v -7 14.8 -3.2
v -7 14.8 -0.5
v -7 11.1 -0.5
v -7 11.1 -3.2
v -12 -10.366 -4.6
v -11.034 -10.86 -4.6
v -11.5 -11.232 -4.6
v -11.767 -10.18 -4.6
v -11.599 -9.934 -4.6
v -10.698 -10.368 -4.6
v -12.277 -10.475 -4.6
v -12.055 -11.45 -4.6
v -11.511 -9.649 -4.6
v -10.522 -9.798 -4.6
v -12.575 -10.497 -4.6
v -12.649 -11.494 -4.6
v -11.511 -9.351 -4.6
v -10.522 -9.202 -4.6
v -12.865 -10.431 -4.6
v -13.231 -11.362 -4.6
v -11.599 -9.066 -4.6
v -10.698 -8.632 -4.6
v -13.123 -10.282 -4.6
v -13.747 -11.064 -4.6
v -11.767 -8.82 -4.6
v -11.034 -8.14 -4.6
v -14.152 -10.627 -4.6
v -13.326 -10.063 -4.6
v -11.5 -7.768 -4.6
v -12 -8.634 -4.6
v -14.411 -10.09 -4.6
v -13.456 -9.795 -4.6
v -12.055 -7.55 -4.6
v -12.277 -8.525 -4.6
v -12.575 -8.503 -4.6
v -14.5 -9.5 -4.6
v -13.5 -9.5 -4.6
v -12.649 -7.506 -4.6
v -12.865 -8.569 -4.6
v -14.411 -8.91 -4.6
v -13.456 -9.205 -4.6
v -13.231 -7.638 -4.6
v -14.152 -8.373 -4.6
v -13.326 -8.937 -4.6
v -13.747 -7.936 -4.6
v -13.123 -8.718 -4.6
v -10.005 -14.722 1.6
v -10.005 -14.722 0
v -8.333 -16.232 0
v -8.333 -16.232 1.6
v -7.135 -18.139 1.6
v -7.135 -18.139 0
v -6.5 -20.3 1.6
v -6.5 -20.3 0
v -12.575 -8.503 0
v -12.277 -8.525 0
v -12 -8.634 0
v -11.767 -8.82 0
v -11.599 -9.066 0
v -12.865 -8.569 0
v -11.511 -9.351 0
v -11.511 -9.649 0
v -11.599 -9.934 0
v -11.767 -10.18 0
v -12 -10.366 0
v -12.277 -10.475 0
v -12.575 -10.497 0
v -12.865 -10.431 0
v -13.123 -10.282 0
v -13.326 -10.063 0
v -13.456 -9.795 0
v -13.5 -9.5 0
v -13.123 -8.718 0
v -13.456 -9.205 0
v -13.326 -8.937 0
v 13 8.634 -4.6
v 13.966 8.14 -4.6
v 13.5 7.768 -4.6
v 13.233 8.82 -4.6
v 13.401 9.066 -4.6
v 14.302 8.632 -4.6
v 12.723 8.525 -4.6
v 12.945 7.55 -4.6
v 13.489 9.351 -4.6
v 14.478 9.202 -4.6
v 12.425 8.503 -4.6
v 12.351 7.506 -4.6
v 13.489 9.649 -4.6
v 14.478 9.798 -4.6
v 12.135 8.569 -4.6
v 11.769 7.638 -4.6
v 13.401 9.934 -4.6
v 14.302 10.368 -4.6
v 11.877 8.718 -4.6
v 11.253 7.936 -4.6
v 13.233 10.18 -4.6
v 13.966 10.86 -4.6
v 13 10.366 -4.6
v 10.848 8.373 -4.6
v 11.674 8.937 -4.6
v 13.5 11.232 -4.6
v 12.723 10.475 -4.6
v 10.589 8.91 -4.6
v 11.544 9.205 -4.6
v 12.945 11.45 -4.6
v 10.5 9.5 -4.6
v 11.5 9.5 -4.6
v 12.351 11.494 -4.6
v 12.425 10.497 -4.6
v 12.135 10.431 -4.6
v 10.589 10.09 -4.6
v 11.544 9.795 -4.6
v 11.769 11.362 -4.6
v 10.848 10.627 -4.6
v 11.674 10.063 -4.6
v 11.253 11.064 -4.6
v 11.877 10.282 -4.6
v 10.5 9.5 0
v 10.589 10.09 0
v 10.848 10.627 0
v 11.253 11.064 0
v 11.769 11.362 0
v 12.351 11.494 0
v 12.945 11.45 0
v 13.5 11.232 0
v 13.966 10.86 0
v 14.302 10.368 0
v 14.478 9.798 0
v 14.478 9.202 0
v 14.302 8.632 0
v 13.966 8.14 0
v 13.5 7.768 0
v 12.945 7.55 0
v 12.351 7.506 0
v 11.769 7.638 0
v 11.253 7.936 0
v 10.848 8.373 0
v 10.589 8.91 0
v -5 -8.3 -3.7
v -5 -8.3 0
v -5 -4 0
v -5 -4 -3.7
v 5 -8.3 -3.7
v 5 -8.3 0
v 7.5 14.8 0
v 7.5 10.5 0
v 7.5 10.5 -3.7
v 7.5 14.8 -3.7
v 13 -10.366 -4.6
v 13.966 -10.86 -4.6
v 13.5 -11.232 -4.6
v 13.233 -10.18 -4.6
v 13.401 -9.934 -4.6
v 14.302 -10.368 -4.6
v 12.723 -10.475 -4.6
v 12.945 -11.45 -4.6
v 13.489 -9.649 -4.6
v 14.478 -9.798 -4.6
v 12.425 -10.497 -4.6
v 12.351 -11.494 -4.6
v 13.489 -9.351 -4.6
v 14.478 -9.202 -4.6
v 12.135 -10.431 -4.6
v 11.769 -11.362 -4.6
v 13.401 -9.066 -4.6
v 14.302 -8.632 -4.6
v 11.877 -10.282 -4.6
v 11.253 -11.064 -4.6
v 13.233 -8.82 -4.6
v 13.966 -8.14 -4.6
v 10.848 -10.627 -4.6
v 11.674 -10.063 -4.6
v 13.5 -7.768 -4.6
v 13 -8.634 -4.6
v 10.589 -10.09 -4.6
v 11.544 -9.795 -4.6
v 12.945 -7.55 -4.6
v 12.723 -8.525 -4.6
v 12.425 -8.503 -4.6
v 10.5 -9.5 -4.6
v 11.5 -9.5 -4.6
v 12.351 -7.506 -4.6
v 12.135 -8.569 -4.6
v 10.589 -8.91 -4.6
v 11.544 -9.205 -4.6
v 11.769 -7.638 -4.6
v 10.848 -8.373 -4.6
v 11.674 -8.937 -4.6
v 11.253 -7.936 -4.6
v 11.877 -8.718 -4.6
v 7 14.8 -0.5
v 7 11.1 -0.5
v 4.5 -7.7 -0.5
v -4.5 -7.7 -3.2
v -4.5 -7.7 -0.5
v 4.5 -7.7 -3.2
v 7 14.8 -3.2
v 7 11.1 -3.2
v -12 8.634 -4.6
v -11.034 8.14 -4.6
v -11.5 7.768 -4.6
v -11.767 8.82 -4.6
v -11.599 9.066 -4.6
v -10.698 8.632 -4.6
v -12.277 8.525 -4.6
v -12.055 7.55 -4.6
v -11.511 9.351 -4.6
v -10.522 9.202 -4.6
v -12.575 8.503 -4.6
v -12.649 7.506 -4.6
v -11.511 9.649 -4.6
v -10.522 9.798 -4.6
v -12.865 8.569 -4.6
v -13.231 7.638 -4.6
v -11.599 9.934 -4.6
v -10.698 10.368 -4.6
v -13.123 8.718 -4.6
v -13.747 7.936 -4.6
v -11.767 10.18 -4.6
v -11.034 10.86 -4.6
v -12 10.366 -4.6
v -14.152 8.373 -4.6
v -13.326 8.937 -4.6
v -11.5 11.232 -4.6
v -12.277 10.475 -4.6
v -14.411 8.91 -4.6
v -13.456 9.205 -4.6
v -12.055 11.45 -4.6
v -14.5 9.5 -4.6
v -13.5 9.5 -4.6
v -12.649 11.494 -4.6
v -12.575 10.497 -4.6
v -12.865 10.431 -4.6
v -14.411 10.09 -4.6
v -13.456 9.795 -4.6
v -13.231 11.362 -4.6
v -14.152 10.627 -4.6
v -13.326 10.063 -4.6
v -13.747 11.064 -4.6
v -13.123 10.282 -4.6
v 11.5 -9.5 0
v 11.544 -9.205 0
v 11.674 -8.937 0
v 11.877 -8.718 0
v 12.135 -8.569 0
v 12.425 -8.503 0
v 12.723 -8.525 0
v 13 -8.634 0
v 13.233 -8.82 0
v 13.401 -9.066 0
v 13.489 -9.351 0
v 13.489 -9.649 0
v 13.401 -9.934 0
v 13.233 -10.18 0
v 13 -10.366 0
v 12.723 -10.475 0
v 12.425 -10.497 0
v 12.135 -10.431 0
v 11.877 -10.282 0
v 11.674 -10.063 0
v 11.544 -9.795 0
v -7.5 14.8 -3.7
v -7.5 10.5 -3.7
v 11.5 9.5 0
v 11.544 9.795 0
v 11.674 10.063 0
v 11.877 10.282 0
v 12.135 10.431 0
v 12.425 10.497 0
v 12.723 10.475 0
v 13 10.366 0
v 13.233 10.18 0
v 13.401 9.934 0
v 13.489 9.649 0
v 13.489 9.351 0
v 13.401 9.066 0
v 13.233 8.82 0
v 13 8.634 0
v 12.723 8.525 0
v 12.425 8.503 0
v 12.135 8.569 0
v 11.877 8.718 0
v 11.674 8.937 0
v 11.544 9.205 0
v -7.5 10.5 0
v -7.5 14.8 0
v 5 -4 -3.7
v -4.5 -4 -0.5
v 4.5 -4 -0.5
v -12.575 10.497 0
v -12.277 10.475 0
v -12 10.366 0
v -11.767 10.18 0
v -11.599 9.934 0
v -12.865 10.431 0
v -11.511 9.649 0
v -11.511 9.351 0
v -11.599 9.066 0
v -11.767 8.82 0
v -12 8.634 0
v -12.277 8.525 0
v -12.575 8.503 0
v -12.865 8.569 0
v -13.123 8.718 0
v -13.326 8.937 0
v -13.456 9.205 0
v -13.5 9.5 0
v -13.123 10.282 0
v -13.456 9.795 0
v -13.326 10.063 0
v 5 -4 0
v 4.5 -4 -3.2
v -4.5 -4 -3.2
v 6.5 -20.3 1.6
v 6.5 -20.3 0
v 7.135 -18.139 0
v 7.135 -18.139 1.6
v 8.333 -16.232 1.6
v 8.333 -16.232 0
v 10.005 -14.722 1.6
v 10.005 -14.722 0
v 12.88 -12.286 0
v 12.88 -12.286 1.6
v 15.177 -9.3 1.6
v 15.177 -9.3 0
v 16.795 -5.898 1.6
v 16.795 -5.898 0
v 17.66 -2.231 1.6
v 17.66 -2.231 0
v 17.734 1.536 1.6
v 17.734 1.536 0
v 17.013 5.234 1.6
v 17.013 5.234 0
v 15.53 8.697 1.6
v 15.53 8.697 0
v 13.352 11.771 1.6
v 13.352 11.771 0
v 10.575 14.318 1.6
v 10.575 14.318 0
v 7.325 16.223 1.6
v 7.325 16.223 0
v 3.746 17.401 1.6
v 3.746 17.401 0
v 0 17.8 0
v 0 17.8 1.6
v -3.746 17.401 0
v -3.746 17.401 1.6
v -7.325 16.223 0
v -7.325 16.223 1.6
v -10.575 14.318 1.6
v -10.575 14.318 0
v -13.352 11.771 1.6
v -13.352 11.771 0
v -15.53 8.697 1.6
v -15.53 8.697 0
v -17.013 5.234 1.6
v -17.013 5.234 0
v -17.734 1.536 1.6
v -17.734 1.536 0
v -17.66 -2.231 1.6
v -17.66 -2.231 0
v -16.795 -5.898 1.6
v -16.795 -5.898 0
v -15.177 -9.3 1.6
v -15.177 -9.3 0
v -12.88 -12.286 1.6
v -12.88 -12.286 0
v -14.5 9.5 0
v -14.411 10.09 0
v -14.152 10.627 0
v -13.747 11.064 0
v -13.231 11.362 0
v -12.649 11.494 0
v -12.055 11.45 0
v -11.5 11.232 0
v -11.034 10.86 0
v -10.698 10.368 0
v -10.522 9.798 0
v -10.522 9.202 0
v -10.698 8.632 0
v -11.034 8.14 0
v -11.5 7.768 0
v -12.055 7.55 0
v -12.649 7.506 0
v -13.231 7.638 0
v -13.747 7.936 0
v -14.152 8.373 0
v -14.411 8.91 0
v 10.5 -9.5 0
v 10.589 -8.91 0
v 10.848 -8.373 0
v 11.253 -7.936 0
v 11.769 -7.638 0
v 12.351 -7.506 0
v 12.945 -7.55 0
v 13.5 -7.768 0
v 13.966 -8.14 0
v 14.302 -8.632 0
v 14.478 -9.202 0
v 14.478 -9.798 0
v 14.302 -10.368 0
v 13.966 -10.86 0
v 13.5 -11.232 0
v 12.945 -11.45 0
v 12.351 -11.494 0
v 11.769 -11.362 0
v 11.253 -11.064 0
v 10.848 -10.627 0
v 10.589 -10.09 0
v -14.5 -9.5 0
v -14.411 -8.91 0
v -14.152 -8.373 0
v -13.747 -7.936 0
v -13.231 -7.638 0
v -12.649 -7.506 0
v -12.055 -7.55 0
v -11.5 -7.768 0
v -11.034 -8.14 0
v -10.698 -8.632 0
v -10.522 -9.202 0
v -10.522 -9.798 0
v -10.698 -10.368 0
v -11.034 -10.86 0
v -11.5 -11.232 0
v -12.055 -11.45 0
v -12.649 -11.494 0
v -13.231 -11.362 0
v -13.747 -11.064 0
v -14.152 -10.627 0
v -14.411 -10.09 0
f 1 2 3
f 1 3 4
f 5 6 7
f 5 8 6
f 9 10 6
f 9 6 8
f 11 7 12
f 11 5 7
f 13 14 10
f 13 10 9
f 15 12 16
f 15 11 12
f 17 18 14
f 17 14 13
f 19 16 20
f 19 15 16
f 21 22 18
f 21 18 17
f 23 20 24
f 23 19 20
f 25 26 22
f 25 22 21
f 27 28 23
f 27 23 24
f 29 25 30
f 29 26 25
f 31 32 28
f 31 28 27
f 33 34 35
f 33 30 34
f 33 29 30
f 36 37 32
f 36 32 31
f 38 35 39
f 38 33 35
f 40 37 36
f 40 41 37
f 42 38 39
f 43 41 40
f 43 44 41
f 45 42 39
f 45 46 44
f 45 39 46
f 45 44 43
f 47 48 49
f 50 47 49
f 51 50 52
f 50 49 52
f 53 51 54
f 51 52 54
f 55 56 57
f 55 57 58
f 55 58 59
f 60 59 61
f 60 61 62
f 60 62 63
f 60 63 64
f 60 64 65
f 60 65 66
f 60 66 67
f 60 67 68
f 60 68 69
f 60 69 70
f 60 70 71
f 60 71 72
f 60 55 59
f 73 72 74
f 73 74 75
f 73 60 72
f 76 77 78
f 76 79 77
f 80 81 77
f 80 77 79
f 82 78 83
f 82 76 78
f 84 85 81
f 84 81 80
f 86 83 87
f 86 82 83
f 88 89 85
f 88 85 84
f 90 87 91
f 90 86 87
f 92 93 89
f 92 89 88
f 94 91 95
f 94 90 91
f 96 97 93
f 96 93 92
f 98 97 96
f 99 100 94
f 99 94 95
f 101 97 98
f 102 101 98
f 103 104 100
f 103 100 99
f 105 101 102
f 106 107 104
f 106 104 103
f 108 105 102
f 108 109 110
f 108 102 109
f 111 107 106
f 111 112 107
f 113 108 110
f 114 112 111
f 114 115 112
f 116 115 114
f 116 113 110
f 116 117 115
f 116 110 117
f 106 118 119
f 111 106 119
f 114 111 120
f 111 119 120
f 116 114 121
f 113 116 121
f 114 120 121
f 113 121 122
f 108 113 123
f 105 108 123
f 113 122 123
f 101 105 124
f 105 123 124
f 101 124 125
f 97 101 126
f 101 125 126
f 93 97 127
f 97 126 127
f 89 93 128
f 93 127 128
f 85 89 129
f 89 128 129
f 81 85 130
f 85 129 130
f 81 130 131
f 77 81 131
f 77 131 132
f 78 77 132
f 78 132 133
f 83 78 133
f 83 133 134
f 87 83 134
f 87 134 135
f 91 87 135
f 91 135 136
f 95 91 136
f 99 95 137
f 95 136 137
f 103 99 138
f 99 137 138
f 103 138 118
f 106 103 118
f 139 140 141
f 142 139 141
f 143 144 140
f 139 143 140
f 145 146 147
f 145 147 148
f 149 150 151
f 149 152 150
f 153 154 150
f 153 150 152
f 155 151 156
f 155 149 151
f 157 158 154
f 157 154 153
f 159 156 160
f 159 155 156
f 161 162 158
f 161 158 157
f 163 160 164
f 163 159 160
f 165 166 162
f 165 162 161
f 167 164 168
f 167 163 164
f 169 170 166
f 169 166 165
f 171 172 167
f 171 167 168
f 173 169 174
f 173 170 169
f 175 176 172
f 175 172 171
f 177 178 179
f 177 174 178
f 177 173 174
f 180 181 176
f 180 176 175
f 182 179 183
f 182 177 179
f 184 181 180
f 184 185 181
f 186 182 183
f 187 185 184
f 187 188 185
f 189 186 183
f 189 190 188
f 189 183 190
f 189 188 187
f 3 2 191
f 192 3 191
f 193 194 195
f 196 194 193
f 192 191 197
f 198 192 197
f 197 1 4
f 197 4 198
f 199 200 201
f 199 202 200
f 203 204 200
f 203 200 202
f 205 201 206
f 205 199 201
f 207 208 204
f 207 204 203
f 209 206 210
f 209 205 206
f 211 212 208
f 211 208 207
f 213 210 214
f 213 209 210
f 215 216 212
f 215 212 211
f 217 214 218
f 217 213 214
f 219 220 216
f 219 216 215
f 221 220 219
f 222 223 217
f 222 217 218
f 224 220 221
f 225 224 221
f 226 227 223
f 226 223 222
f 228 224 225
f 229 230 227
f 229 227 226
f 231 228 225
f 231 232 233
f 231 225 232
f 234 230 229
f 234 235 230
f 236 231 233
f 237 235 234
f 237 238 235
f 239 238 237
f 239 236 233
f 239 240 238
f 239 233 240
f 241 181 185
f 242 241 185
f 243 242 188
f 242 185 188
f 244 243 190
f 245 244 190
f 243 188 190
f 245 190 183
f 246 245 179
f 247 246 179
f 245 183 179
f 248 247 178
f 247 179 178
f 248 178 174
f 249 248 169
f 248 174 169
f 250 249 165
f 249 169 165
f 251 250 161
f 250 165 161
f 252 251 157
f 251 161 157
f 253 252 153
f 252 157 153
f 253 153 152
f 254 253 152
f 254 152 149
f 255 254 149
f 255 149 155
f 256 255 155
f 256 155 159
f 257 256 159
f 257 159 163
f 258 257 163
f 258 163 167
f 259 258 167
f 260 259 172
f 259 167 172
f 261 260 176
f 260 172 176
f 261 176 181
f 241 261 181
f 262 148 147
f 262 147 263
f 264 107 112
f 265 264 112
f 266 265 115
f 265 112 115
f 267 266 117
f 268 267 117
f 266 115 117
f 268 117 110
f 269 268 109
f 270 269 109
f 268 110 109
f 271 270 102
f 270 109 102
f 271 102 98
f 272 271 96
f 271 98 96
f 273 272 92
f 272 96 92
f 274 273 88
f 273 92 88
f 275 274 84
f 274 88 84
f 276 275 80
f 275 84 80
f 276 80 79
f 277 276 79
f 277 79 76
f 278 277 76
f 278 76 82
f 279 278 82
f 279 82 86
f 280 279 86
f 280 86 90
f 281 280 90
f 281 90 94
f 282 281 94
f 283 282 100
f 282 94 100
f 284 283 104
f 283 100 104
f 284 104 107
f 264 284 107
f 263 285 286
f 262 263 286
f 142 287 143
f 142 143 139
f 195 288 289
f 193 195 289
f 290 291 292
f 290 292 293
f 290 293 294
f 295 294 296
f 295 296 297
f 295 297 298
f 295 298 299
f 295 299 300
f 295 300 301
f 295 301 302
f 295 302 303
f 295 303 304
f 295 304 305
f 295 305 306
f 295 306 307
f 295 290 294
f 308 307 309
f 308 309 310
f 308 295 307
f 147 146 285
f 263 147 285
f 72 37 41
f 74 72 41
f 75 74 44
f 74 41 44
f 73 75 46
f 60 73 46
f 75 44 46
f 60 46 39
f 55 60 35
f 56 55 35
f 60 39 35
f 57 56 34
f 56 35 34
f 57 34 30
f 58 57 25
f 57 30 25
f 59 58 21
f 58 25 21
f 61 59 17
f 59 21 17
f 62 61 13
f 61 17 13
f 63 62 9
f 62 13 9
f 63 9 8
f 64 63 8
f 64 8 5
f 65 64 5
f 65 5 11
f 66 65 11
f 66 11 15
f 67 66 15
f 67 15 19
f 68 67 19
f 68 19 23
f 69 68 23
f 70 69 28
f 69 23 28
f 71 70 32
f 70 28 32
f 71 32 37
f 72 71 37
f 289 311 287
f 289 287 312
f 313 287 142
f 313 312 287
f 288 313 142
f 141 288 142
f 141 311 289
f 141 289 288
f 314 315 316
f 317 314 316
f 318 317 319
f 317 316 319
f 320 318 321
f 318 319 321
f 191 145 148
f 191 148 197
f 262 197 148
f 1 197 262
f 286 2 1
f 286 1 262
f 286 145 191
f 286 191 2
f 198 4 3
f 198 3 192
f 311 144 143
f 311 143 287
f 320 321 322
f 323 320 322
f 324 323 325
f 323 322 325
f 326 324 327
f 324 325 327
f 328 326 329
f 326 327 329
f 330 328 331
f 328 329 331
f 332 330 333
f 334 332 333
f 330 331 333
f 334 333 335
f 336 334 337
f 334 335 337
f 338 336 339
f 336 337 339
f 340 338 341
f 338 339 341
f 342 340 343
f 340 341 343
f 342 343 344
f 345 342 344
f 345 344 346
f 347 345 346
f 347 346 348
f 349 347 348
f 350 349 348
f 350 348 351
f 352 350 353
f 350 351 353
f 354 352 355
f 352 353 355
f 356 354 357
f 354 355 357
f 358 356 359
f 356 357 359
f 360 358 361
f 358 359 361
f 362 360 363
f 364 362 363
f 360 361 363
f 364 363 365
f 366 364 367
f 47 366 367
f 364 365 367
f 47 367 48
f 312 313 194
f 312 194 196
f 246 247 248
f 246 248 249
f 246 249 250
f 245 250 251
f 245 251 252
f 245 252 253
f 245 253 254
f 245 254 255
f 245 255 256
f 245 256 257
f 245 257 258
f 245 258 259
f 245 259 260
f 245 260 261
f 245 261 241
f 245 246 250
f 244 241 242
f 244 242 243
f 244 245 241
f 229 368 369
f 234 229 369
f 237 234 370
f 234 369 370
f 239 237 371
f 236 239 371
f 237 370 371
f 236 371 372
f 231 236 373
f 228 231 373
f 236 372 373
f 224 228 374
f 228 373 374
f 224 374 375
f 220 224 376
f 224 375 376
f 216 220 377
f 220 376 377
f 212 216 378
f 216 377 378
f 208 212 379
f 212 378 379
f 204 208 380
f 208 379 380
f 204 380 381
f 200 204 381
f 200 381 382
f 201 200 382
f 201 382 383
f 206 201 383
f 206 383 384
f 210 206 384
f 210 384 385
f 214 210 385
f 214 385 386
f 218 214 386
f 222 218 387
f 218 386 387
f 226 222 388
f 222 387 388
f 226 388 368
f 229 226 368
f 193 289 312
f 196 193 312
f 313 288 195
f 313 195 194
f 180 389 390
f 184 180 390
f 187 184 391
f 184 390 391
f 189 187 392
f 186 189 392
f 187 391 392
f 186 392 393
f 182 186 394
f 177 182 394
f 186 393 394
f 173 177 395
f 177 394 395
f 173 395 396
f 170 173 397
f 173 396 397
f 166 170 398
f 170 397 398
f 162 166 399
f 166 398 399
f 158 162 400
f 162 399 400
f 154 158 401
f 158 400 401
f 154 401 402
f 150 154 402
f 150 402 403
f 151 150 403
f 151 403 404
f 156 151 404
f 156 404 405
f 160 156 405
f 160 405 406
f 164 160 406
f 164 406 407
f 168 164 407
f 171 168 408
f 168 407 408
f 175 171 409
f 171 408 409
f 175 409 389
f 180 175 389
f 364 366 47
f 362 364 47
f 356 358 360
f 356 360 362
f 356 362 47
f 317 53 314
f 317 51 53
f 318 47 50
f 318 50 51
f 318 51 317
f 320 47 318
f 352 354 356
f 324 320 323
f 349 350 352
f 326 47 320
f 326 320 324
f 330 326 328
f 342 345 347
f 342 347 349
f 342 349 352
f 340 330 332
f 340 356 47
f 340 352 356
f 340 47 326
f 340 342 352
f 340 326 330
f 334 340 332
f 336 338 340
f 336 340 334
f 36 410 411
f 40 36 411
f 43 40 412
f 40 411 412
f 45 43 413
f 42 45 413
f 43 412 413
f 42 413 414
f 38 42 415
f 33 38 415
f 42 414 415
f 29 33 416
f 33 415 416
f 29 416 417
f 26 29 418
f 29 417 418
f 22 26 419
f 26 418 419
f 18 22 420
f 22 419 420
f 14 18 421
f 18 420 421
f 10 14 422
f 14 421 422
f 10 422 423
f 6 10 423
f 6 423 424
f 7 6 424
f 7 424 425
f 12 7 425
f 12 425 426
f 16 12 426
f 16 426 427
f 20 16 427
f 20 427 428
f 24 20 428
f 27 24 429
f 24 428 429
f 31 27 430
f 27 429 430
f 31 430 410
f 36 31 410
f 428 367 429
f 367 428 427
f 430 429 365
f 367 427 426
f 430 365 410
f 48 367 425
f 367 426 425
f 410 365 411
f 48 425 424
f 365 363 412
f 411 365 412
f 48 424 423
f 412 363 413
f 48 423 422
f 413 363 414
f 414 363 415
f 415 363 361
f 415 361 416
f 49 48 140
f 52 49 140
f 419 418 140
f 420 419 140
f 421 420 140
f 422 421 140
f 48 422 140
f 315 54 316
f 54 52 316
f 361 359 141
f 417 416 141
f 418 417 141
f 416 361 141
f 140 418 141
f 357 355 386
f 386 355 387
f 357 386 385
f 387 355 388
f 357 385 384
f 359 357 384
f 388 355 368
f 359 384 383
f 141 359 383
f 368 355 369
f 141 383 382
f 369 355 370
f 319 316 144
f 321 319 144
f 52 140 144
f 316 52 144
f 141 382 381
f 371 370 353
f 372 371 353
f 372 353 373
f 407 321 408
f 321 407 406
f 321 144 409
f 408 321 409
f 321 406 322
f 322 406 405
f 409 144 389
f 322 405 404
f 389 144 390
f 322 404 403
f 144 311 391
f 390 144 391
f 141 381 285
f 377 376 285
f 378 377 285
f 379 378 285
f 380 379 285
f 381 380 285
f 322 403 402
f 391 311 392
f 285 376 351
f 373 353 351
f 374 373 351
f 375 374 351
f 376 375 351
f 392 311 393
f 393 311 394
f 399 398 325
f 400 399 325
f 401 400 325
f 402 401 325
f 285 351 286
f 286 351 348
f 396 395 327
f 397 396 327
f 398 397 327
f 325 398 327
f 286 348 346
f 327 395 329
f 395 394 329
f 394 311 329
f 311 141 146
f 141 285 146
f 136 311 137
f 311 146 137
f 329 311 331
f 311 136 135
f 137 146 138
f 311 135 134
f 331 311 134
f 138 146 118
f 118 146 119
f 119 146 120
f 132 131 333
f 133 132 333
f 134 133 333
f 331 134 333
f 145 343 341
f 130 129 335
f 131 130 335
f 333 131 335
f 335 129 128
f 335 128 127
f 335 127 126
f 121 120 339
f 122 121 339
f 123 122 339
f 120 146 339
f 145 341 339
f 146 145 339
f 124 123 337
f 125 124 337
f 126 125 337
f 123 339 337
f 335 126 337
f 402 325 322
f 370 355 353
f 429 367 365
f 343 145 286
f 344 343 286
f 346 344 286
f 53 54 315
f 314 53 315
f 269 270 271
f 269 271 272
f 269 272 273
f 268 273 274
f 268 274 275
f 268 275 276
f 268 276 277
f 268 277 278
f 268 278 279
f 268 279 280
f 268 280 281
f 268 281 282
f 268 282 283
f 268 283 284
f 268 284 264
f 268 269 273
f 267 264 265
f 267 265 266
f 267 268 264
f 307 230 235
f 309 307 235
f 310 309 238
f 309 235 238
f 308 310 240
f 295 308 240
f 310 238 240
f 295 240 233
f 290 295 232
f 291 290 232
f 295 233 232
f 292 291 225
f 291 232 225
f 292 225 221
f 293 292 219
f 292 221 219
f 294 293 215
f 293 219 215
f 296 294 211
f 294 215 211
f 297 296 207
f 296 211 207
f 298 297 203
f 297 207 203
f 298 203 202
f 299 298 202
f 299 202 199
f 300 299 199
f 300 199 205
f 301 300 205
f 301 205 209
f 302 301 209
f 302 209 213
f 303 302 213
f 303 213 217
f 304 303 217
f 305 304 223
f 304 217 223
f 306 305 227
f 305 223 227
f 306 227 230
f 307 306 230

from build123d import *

# Parameters (mm, degrees)
BOSS_EXTRU_1_CONTOUR_CRAN_DEPTH              = 1.6
ENTRETOISES_R                                = 2
BOSS_EXTRU_1_ENTRETOISES_DEPTH               = 4.6
TROUS_VIS_M2_R                               = 1
ENL_V_MAT_EXTRU_1_TROUS_VIS_M2_DEPTH         = 4.6
CONNECTEURS_BLANCS_W                         = 15
CONNECTEURS_BLANCS_H                         = 4.3
CONNECTEURS_BLANCS_W_2                       = 10
BOSS_EXTRU_2_CONNECTEURS_BLANCS_DEPTH        = 3.7
OUVERTURE_GROS_CONNECTEUR_BLANC_W            = 14
OUVERTURE_GROS_CONNECTEUR_BLANC_H            = 2.7
ENL_V_MAT_EXTRU_2_OUVERTURE_GROS_CONNE_DEPTH = 3.7
OUVERTURE_PETIT_CONNECTEUR_BLANC_W           = 9
OUVERTURE_PETIT_CONNECTEUR_BLANC_H           = 2.7
ENL_V_MAT_EXTRU_3_OUVERTURE_PETIT_CONN_DEPTH = 3.7


with BuildPart() as part:
    # Contour_Écran → Boss.-Extru.1_Contour_Écran (new body)
    with BuildSketch(Plane.XY):
        with BuildLine():
            Line((-6.5, -20.3), (6.5, -20.3))
            ThreePointArc((6.5, -20.3), (7.668481961, -17.144005216), (10.005084126, -14.722034222))
            ThreePointArc((10.005084126, -14.722034222), (0, 17.8), (-10.005084126, -14.722034222))
            ThreePointArc((-10.005084126, -14.722034222), (-7.668481961, -17.144005216), (-6.5, -20.3))
        make_face()
    extrude(amount=BOSS_EXTRU_1_CONTOUR_CRAN_DEPTH)

    # Entretoises → Boss.-Extru.1_Entretoises (add)
    with BuildSketch(Plane(origin=(0, 0, 0), x_dir=(-1, 0, 0), z_dir=(0, 0, -1))):
        with Locations((-12.5, 9.5)):
            Circle(ENTRETOISES_R)
        with Locations((12.5, 9.5)):
            Circle(ENTRETOISES_R)
        with Locations((12.5, -9.5)):
            Circle(ENTRETOISES_R)
        with Locations((-12.5, -9.5)):
            Circle(ENTRETOISES_R)
    extrude(amount=BOSS_EXTRU_1_ENTRETOISES_DEPTH)

    # Trous_Vis_M2 → Enlèv. mat.-Extru.1_Trous_Vis_M2 (cut)
    with BuildSketch(Plane(origin=(0, 0, -4.6), x_dir=(-1, 0, 0), z_dir=(0, 0, -1))):
        with Locations((-12.5, 9.5)):
            Circle(TROUS_VIS_M2_R)
        with Locations((12.5, 9.5)):
            Circle(TROUS_VIS_M2_R)
        with Locations((12.5, -9.5)):
            Circle(TROUS_VIS_M2_R)
        with Locations((-12.5, -9.5)):
            Circle(TROUS_VIS_M2_R)
    extrude(amount=-ENL_V_MAT_EXTRU_1_TROUS_VIS_M2_DEPTH, mode=Mode.SUBTRACT)

    # Connecteurs_Blancs → Boss.-Extru.2_Connecteurs_Blancs (add)
    with BuildSketch(Plane(origin=(0, 0, 0), x_dir=(-1, 0, 0), z_dir=(0, 0, -1))):
        with Locations((0, 12.65)):
            Rectangle(CONNECTEURS_BLANCS_W, CONNECTEURS_BLANCS_H)
        with Locations((0, -6.15)):
            Rectangle(CONNECTEURS_BLANCS_W_2, CONNECTEURS_BLANCS_H)
    extrude(amount=BOSS_EXTRU_2_CONNECTEURS_BLANCS_DEPTH)

    # Ouverture_gros_connecteur_blanc → Enlèv. mat.-Extru.2_Ouverture_gros_connecteur_blanc (cut)
    with BuildSketch(Plane(origin=(0, 14.8, 0), x_dir=(1, 0, 0), z_dir=(0, 1, 0))):
        with Locations((0, 1.85)):
            Rectangle(OUVERTURE_GROS_CONNECTEUR_BLANC_W, OUVERTURE_GROS_CONNECTEUR_BLANC_H)
    extrude(amount=-ENL_V_MAT_EXTRU_2_OUVERTURE_GROS_CONNE_DEPTH, mode=Mode.SUBTRACT)

    # Ouverture_petit_connecteur_blanc → Enlèv. mat.-Extru.3_Ouverture_petit_connecteur_blanc (cut)
    with BuildSketch(Plane(origin=(0, -4, 0), x_dir=(1, 0, 0), z_dir=(0, 1, 0))):
        with Locations((0, 1.85)):
            Rectangle(OUVERTURE_PETIT_CONNECTEUR_BLANC_W, OUVERTURE_PETIT_CONNECTEUR_BLANC_H)
    extrude(amount=-ENL_V_MAT_EXTRU_3_OUVERTURE_PETIT_CONN_DEPTH, mode=Mode.SUBTRACT)


solid = part.part
